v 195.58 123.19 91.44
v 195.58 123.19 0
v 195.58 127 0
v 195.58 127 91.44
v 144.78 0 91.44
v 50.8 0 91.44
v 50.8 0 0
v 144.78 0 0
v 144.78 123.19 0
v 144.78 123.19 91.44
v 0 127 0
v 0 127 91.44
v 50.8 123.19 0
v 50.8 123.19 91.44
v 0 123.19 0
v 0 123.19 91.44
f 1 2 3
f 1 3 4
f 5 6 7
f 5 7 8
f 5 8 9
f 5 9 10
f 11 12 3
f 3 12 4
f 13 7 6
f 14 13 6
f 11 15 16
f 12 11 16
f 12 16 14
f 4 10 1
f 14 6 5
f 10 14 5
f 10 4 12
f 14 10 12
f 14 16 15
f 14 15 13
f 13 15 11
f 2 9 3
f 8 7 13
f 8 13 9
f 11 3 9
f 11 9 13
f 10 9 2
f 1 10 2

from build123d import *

# Parameters (mm, degrees)
F0_W     = 195.58
F0_H     = 91.44
F1_DEPTH = 127
F2_W     = 50.8
F2_H     = 91.44
F3_DEPTH = 123.19


with BuildPart() as f1:
    # F0 (on Front) → F1 (new body)
    with BuildSketch(Plane.XZ):
        with Locations((97.79, 45.72)):
            Rectangle(F0_W, F0_H)
    extrude(amount=-F1_DEPTH)

    # F2 (on face) → F3 (cut)
    with BuildSketch(Plane.XZ):
        with Locations((25.4, 45.72)):
            Rectangle(F2_W, F2_H)
        with Locations((170.18, 45.72)):
            Rectangle(F2_W, F2_H)
    extrude(amount=-F3_DEPTH, mode=Mode.SUBTRACT)


solid = f1.part
